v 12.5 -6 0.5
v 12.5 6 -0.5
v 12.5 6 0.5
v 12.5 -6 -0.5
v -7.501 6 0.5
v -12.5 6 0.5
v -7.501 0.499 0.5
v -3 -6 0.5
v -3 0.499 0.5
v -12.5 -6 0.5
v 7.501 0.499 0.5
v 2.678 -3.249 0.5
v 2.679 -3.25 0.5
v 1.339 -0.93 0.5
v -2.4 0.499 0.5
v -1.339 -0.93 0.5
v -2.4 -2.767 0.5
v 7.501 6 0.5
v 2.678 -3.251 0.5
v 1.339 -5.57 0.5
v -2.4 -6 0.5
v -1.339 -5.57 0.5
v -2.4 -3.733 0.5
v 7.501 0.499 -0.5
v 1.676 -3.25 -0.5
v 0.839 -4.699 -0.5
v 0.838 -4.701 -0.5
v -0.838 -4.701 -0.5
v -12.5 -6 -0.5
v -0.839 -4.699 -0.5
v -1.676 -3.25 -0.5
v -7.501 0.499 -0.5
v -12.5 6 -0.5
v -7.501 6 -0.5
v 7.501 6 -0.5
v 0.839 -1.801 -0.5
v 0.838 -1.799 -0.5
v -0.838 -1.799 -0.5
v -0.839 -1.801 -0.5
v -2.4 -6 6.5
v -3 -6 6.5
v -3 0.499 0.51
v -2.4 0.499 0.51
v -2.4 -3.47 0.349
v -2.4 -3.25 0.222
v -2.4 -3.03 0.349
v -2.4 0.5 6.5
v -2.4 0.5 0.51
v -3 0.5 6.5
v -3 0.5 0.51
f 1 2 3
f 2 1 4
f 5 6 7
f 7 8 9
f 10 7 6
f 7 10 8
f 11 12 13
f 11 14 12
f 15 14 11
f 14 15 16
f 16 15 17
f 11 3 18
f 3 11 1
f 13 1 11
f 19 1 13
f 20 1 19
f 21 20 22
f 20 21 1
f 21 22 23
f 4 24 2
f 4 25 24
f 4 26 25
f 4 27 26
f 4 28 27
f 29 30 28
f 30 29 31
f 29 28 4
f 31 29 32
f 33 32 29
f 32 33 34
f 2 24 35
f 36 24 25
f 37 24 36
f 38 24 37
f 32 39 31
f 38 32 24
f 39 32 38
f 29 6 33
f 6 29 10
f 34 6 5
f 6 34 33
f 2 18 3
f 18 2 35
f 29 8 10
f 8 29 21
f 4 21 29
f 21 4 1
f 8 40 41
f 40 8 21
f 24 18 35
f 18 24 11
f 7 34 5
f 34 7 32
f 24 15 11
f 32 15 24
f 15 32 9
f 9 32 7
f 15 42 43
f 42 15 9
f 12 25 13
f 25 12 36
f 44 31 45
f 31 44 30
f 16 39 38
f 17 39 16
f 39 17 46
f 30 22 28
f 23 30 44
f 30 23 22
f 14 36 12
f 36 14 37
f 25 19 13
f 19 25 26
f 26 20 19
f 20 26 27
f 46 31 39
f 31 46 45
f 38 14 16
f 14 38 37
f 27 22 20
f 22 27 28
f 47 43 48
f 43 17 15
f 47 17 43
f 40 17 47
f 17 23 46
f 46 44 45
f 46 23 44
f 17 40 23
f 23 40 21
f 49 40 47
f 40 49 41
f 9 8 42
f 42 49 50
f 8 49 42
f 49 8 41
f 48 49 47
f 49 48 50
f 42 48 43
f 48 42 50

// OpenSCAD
// How wide is your printer nozzle, for hole size correction
nozzleWidth=0.4; //[0.1,0.2,0.3,0.4,0.5,0.6]
halfNozzleWidth=nozzleWidth/2;
// How wide is your carraige
carraigeWidth=25; //[20:40]
// How deep is the carraige from front to back
carraigeDepth=12; // [4:30]
// How deep is the section where the belt goes through 0 for no belt
carraigeBeltPathDepth=5.5; 
// How wide is the cutout for the belt
carraigeBeltPathWidth=15; //[5:30]
// Where is the bolt located divide in half for the middle
carraigeMountBolt=12.5; 
// The offset for the sensor location
opticalBreakOffset=3; // [0:10]
// How thick should the break be
opticalBreakThickess=.6; //[0.1:0.9]
// How tall should the optical break be
opticalBreakHeight=7; //[4:10]
// How thick should the mounting bracket be
opticalBreakMountThickness=1; //[1:3]
// How many points the screw holes should have
circleRadiusPoints=6; //[3:30]
// The radius of the screw hole
screwHoleRadius=1.475;

module OpticalBreak(){
    beltDepthOffset = carraigeDepth - carraigeBeltPathDepth;
    halfBeltDepthOffset = beltDepthOffset / 2;
    halfOpticalBreakHeight=opticalBreakHeight/2;
    halfOpticalBreakMountThickness=opticalBreakMountThickness/2;
    holeRadius=screwHoleRadius+halfNozzleWidth;
    union() {
        
        difference() {
            cube([carraigeWidth, carraigeDepth, opticalBreakMountThickness], center=true);
            translate([0, halfBeltDepthOffset,0]) 
            cube([carraigeBeltPathWidth + 0.002, carraigeBeltPathDepth + 0.002, opticalBreakMountThickness + 0.02], center=true);
            translate([0, -halfBeltDepthOffset,0]) 
    cylinder(h = opticalBreakMountThickness + 0.002, r1 = holeRadius, r2= holeRadius * 1.6, center = true, $fn = circleRadiusPoints);
        }
        difference() {
        translate([-opticalBreakOffset + (opticalBreakThickess / 2) , -halfBeltDepthOffset + (0.5) , halfOpticalBreakHeight - (halfOpticalBreakMountThickness) ]) 
        cube([opticalBreakThickess, beltDepthOffset, opticalBreakHeight], center=true);
           translate([0, halfBeltDepthOffset,0]) 
            cube([carraigeBeltPathWidth + 0.002, carraigeBeltPathDepth + 0.002, opticalBreakMountThickness + 0.02], center=true); 
            
        }

    }
}


OpticalBreak();
//mirror([0,1,0]) 
//OpticalBreak();
